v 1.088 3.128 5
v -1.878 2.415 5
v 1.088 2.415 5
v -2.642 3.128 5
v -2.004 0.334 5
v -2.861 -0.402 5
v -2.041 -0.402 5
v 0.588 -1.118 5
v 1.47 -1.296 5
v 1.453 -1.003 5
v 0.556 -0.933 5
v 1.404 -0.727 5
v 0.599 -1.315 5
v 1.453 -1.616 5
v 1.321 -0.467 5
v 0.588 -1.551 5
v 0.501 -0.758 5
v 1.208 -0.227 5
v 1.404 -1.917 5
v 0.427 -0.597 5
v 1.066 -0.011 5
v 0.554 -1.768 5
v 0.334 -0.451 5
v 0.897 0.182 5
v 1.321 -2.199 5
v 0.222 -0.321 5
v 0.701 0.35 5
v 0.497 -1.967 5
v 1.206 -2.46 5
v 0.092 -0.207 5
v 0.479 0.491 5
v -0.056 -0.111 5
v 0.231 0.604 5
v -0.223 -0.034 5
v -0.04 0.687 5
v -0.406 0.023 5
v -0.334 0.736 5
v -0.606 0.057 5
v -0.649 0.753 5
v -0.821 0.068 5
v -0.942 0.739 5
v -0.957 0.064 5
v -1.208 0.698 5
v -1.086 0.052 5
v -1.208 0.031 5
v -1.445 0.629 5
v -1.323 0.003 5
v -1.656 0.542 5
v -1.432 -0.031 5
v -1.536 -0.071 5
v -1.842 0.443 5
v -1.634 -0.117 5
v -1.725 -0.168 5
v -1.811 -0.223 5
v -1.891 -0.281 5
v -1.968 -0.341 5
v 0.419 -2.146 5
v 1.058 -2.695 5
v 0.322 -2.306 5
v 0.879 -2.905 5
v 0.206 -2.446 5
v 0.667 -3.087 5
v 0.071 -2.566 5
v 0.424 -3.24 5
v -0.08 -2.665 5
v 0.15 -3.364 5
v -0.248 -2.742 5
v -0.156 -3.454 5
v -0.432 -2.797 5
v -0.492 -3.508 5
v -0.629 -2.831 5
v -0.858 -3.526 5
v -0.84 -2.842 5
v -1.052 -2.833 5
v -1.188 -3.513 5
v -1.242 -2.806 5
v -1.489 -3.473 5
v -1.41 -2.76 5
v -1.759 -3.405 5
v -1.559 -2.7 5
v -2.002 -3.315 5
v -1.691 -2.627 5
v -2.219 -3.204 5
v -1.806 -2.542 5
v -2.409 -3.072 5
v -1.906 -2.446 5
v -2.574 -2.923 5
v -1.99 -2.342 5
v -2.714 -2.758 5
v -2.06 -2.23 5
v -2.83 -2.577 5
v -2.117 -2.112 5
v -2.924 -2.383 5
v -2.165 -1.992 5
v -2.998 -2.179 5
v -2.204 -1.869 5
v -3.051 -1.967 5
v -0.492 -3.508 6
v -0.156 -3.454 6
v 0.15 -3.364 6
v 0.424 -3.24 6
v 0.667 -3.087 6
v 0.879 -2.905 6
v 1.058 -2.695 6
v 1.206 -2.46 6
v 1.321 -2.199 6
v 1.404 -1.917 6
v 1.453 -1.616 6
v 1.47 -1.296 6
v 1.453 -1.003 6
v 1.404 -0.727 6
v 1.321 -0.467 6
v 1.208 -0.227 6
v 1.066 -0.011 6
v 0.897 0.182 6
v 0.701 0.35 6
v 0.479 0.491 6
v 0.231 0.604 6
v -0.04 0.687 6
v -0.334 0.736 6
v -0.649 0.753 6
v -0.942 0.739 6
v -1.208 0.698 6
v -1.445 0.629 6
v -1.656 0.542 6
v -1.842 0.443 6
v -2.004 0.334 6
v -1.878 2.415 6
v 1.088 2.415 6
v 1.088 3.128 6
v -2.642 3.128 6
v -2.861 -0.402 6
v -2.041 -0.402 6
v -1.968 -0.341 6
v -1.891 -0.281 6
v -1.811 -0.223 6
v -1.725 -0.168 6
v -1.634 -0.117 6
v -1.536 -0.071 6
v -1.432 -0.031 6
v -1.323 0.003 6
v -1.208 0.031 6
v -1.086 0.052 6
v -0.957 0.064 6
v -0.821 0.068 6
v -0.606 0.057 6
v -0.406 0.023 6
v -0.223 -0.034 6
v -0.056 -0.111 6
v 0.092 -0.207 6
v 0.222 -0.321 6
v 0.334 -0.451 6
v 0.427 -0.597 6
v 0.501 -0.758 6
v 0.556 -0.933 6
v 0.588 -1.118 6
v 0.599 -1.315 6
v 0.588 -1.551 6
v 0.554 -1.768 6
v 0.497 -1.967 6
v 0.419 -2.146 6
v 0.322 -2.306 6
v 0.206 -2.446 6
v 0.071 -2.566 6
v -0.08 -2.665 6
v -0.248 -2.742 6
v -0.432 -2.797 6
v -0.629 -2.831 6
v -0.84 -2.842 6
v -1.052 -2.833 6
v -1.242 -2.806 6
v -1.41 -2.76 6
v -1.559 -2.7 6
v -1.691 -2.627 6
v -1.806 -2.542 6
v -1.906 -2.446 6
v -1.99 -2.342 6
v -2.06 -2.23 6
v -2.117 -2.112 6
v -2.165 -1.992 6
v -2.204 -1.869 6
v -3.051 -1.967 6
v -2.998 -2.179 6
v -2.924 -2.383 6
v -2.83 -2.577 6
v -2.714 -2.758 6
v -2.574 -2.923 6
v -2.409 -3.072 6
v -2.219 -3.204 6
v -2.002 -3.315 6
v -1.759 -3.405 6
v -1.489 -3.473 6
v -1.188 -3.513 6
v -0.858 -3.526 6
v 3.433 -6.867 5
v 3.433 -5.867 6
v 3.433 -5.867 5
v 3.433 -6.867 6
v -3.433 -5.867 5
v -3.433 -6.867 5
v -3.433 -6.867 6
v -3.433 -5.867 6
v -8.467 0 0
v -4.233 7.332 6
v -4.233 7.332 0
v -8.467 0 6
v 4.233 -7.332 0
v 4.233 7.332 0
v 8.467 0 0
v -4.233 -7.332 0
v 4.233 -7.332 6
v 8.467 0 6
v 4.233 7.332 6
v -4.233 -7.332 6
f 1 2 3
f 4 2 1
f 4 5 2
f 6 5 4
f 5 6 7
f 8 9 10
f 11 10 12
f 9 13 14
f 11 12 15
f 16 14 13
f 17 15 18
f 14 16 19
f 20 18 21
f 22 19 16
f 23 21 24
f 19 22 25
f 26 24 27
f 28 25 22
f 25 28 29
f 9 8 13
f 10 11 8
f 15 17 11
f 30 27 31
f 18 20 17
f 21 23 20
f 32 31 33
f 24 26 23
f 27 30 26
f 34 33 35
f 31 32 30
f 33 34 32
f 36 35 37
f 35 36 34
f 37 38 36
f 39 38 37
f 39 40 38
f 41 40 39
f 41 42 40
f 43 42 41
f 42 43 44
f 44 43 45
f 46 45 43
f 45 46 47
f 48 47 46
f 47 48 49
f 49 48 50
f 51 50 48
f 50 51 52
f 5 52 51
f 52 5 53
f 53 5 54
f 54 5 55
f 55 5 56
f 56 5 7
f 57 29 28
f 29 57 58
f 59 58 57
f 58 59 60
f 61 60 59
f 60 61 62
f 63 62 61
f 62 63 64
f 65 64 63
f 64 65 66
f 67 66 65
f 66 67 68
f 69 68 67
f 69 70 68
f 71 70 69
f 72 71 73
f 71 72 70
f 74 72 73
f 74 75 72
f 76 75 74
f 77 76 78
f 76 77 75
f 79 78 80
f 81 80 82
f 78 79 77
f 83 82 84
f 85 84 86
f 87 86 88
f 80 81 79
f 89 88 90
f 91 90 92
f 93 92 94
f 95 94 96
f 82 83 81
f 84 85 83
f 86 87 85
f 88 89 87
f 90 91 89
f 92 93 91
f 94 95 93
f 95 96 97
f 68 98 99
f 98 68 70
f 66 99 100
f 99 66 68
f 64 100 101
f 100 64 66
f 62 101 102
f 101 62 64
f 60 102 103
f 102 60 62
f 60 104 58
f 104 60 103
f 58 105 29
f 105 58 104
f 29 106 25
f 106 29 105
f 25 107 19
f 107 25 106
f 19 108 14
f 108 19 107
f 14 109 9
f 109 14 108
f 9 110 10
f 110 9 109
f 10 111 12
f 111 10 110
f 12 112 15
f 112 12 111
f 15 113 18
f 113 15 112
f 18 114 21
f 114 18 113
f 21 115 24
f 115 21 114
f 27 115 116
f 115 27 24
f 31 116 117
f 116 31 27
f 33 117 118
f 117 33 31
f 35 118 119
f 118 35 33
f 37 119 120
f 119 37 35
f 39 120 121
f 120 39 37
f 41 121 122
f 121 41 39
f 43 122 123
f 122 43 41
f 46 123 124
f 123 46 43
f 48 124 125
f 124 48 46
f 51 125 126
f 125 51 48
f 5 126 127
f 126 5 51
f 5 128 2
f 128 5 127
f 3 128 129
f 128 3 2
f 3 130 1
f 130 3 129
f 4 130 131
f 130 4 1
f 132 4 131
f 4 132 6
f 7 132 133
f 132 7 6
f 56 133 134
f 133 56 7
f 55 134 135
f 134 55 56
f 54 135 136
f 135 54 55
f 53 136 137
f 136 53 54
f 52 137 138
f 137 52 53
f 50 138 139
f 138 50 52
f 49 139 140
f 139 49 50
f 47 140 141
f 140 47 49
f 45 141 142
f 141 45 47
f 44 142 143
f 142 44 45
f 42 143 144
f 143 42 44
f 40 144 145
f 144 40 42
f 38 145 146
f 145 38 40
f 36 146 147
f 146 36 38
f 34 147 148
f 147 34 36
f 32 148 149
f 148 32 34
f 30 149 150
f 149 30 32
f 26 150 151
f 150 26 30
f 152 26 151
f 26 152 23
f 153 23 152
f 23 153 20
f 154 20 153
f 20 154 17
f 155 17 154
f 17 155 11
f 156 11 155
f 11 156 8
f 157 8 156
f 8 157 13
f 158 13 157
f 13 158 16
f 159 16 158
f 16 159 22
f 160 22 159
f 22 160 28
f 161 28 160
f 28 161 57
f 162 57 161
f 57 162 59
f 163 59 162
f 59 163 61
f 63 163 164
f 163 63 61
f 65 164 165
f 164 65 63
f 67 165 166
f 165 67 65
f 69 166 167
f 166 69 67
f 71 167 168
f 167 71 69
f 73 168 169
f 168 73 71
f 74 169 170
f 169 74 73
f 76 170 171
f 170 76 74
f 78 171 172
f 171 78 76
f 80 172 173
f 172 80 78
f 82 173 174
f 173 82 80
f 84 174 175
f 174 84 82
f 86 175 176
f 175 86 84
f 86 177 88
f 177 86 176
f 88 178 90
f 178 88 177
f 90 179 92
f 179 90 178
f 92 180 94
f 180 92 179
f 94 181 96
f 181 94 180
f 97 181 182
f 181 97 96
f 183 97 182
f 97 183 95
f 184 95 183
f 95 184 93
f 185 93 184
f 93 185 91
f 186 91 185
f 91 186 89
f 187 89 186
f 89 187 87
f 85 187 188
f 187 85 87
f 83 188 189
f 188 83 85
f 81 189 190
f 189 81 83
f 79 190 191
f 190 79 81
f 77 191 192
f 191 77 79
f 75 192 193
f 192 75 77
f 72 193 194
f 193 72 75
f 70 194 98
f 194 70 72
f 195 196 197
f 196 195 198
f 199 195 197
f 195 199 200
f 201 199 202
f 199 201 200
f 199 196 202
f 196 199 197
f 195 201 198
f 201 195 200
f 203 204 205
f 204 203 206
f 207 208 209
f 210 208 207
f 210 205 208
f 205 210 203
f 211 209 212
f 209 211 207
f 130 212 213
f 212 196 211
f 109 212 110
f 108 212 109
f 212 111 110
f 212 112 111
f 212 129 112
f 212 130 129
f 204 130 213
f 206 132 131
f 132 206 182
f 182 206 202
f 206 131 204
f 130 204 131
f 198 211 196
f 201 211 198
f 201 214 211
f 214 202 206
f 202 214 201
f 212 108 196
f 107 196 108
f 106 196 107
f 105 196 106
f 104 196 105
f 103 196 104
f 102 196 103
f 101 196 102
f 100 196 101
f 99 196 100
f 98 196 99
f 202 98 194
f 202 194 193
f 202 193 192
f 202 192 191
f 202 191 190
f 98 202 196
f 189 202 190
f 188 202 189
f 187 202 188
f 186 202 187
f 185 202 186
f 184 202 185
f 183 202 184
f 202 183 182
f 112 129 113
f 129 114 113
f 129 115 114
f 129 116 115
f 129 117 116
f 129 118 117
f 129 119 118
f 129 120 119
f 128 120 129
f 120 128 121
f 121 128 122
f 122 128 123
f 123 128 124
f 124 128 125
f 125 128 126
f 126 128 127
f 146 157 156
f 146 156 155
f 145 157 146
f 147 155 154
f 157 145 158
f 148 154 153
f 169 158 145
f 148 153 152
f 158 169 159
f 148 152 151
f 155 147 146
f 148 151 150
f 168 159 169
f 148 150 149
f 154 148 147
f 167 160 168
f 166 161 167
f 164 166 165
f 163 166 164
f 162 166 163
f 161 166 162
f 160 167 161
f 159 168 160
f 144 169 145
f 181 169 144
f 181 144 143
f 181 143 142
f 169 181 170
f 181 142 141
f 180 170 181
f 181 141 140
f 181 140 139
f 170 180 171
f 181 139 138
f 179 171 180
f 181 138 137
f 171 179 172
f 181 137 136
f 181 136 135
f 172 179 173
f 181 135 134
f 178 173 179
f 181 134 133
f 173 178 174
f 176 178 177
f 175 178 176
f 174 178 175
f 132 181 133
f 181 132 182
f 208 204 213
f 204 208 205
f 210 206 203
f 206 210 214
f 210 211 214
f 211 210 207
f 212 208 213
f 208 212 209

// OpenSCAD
// file: ../library/calculate.scad
module inlay(depth)
{
    difference()
    {
        children(0);
        translate([ 0, 0, depth ]) children([1:$children - 1]);
    }
}
// file: ../library/variables.scad
// Variables

die_width = 12;
double_digit_placement = 1; // 0.7 for 8mm, 1 for 12mm

wiggle_width = 0.2;
separator = 1.6;
base_plate_sides = 5;
token_sides = 6;
slot_height = 1;

// Calculations

height = die_width / 2;

die_slot_width = die_width + wiggle_width;
die_slot_y = -1 * ((die_slot_width / 2) + separator);
die_slot_right_x = (die_slot_width / 2) + separator;
die_slot_left_x = -1 * (die_slot_width / 2) - separator;

base_plate_size = (die_slot_width * 2) + separator;
inset_width = base_plate_size - separator;
inset_depth = height - separator;

shallow_slot_height = (height - inset_depth) / 2;

token_slot_width = base_plate_size / 3;
token_width = token_slot_width - wiggle_width;
token_height = height;
token_slot_y = (die_slot_width / 2) + (separator * 2);
token_inset_height = token_height - 1;
token_doubledigit_font_size = token_width - separator;

token_poison_width = (token_width / 3);
token_poison_placement = (token_width / 3);
// file: ../library/tokens.scad
include <variables.scad>
include <calculate.scad>

module token_base()
{
    linear_extrude(token_height) circle(token_width, $fn = token_sides);
}

module token_doubledigit_number(num) 
{
    inlay(depth = token_inset_height) 
    {
        token_base();
        translate([-1 * token_doubledigit_font_size + double_digit_placement, -1 * token_doubledigit_font_size / 2, 0]) linear_extrude(token_height) text(text = num, size = token_doubledigit_font_size);
        translate([-1 * token_doubledigit_font_size / 2, -1 * token_doubledigit_font_size, 0]) cube([token_doubledigit_font_size, 1, 2]);
    }
}

module token_singledigit_number(num) 
{ 
    inlay(depth = token_inset_height) 
    {
        token_base();
        translate([-1 * (token_doubledigit_font_size / 2), -1 * token_doubledigit_font_size / 2, 0]) linear_extrude(token_height) text(text = num, size = token_doubledigit_font_size);
        translate([-1 * token_doubledigit_font_size / 2, -1 * token_doubledigit_font_size, 0]) cube([token_doubledigit_font_size, 1, 2]);
    }
}
// main file
include <../library/tokens.scad>

token_singledigit_number("5");
